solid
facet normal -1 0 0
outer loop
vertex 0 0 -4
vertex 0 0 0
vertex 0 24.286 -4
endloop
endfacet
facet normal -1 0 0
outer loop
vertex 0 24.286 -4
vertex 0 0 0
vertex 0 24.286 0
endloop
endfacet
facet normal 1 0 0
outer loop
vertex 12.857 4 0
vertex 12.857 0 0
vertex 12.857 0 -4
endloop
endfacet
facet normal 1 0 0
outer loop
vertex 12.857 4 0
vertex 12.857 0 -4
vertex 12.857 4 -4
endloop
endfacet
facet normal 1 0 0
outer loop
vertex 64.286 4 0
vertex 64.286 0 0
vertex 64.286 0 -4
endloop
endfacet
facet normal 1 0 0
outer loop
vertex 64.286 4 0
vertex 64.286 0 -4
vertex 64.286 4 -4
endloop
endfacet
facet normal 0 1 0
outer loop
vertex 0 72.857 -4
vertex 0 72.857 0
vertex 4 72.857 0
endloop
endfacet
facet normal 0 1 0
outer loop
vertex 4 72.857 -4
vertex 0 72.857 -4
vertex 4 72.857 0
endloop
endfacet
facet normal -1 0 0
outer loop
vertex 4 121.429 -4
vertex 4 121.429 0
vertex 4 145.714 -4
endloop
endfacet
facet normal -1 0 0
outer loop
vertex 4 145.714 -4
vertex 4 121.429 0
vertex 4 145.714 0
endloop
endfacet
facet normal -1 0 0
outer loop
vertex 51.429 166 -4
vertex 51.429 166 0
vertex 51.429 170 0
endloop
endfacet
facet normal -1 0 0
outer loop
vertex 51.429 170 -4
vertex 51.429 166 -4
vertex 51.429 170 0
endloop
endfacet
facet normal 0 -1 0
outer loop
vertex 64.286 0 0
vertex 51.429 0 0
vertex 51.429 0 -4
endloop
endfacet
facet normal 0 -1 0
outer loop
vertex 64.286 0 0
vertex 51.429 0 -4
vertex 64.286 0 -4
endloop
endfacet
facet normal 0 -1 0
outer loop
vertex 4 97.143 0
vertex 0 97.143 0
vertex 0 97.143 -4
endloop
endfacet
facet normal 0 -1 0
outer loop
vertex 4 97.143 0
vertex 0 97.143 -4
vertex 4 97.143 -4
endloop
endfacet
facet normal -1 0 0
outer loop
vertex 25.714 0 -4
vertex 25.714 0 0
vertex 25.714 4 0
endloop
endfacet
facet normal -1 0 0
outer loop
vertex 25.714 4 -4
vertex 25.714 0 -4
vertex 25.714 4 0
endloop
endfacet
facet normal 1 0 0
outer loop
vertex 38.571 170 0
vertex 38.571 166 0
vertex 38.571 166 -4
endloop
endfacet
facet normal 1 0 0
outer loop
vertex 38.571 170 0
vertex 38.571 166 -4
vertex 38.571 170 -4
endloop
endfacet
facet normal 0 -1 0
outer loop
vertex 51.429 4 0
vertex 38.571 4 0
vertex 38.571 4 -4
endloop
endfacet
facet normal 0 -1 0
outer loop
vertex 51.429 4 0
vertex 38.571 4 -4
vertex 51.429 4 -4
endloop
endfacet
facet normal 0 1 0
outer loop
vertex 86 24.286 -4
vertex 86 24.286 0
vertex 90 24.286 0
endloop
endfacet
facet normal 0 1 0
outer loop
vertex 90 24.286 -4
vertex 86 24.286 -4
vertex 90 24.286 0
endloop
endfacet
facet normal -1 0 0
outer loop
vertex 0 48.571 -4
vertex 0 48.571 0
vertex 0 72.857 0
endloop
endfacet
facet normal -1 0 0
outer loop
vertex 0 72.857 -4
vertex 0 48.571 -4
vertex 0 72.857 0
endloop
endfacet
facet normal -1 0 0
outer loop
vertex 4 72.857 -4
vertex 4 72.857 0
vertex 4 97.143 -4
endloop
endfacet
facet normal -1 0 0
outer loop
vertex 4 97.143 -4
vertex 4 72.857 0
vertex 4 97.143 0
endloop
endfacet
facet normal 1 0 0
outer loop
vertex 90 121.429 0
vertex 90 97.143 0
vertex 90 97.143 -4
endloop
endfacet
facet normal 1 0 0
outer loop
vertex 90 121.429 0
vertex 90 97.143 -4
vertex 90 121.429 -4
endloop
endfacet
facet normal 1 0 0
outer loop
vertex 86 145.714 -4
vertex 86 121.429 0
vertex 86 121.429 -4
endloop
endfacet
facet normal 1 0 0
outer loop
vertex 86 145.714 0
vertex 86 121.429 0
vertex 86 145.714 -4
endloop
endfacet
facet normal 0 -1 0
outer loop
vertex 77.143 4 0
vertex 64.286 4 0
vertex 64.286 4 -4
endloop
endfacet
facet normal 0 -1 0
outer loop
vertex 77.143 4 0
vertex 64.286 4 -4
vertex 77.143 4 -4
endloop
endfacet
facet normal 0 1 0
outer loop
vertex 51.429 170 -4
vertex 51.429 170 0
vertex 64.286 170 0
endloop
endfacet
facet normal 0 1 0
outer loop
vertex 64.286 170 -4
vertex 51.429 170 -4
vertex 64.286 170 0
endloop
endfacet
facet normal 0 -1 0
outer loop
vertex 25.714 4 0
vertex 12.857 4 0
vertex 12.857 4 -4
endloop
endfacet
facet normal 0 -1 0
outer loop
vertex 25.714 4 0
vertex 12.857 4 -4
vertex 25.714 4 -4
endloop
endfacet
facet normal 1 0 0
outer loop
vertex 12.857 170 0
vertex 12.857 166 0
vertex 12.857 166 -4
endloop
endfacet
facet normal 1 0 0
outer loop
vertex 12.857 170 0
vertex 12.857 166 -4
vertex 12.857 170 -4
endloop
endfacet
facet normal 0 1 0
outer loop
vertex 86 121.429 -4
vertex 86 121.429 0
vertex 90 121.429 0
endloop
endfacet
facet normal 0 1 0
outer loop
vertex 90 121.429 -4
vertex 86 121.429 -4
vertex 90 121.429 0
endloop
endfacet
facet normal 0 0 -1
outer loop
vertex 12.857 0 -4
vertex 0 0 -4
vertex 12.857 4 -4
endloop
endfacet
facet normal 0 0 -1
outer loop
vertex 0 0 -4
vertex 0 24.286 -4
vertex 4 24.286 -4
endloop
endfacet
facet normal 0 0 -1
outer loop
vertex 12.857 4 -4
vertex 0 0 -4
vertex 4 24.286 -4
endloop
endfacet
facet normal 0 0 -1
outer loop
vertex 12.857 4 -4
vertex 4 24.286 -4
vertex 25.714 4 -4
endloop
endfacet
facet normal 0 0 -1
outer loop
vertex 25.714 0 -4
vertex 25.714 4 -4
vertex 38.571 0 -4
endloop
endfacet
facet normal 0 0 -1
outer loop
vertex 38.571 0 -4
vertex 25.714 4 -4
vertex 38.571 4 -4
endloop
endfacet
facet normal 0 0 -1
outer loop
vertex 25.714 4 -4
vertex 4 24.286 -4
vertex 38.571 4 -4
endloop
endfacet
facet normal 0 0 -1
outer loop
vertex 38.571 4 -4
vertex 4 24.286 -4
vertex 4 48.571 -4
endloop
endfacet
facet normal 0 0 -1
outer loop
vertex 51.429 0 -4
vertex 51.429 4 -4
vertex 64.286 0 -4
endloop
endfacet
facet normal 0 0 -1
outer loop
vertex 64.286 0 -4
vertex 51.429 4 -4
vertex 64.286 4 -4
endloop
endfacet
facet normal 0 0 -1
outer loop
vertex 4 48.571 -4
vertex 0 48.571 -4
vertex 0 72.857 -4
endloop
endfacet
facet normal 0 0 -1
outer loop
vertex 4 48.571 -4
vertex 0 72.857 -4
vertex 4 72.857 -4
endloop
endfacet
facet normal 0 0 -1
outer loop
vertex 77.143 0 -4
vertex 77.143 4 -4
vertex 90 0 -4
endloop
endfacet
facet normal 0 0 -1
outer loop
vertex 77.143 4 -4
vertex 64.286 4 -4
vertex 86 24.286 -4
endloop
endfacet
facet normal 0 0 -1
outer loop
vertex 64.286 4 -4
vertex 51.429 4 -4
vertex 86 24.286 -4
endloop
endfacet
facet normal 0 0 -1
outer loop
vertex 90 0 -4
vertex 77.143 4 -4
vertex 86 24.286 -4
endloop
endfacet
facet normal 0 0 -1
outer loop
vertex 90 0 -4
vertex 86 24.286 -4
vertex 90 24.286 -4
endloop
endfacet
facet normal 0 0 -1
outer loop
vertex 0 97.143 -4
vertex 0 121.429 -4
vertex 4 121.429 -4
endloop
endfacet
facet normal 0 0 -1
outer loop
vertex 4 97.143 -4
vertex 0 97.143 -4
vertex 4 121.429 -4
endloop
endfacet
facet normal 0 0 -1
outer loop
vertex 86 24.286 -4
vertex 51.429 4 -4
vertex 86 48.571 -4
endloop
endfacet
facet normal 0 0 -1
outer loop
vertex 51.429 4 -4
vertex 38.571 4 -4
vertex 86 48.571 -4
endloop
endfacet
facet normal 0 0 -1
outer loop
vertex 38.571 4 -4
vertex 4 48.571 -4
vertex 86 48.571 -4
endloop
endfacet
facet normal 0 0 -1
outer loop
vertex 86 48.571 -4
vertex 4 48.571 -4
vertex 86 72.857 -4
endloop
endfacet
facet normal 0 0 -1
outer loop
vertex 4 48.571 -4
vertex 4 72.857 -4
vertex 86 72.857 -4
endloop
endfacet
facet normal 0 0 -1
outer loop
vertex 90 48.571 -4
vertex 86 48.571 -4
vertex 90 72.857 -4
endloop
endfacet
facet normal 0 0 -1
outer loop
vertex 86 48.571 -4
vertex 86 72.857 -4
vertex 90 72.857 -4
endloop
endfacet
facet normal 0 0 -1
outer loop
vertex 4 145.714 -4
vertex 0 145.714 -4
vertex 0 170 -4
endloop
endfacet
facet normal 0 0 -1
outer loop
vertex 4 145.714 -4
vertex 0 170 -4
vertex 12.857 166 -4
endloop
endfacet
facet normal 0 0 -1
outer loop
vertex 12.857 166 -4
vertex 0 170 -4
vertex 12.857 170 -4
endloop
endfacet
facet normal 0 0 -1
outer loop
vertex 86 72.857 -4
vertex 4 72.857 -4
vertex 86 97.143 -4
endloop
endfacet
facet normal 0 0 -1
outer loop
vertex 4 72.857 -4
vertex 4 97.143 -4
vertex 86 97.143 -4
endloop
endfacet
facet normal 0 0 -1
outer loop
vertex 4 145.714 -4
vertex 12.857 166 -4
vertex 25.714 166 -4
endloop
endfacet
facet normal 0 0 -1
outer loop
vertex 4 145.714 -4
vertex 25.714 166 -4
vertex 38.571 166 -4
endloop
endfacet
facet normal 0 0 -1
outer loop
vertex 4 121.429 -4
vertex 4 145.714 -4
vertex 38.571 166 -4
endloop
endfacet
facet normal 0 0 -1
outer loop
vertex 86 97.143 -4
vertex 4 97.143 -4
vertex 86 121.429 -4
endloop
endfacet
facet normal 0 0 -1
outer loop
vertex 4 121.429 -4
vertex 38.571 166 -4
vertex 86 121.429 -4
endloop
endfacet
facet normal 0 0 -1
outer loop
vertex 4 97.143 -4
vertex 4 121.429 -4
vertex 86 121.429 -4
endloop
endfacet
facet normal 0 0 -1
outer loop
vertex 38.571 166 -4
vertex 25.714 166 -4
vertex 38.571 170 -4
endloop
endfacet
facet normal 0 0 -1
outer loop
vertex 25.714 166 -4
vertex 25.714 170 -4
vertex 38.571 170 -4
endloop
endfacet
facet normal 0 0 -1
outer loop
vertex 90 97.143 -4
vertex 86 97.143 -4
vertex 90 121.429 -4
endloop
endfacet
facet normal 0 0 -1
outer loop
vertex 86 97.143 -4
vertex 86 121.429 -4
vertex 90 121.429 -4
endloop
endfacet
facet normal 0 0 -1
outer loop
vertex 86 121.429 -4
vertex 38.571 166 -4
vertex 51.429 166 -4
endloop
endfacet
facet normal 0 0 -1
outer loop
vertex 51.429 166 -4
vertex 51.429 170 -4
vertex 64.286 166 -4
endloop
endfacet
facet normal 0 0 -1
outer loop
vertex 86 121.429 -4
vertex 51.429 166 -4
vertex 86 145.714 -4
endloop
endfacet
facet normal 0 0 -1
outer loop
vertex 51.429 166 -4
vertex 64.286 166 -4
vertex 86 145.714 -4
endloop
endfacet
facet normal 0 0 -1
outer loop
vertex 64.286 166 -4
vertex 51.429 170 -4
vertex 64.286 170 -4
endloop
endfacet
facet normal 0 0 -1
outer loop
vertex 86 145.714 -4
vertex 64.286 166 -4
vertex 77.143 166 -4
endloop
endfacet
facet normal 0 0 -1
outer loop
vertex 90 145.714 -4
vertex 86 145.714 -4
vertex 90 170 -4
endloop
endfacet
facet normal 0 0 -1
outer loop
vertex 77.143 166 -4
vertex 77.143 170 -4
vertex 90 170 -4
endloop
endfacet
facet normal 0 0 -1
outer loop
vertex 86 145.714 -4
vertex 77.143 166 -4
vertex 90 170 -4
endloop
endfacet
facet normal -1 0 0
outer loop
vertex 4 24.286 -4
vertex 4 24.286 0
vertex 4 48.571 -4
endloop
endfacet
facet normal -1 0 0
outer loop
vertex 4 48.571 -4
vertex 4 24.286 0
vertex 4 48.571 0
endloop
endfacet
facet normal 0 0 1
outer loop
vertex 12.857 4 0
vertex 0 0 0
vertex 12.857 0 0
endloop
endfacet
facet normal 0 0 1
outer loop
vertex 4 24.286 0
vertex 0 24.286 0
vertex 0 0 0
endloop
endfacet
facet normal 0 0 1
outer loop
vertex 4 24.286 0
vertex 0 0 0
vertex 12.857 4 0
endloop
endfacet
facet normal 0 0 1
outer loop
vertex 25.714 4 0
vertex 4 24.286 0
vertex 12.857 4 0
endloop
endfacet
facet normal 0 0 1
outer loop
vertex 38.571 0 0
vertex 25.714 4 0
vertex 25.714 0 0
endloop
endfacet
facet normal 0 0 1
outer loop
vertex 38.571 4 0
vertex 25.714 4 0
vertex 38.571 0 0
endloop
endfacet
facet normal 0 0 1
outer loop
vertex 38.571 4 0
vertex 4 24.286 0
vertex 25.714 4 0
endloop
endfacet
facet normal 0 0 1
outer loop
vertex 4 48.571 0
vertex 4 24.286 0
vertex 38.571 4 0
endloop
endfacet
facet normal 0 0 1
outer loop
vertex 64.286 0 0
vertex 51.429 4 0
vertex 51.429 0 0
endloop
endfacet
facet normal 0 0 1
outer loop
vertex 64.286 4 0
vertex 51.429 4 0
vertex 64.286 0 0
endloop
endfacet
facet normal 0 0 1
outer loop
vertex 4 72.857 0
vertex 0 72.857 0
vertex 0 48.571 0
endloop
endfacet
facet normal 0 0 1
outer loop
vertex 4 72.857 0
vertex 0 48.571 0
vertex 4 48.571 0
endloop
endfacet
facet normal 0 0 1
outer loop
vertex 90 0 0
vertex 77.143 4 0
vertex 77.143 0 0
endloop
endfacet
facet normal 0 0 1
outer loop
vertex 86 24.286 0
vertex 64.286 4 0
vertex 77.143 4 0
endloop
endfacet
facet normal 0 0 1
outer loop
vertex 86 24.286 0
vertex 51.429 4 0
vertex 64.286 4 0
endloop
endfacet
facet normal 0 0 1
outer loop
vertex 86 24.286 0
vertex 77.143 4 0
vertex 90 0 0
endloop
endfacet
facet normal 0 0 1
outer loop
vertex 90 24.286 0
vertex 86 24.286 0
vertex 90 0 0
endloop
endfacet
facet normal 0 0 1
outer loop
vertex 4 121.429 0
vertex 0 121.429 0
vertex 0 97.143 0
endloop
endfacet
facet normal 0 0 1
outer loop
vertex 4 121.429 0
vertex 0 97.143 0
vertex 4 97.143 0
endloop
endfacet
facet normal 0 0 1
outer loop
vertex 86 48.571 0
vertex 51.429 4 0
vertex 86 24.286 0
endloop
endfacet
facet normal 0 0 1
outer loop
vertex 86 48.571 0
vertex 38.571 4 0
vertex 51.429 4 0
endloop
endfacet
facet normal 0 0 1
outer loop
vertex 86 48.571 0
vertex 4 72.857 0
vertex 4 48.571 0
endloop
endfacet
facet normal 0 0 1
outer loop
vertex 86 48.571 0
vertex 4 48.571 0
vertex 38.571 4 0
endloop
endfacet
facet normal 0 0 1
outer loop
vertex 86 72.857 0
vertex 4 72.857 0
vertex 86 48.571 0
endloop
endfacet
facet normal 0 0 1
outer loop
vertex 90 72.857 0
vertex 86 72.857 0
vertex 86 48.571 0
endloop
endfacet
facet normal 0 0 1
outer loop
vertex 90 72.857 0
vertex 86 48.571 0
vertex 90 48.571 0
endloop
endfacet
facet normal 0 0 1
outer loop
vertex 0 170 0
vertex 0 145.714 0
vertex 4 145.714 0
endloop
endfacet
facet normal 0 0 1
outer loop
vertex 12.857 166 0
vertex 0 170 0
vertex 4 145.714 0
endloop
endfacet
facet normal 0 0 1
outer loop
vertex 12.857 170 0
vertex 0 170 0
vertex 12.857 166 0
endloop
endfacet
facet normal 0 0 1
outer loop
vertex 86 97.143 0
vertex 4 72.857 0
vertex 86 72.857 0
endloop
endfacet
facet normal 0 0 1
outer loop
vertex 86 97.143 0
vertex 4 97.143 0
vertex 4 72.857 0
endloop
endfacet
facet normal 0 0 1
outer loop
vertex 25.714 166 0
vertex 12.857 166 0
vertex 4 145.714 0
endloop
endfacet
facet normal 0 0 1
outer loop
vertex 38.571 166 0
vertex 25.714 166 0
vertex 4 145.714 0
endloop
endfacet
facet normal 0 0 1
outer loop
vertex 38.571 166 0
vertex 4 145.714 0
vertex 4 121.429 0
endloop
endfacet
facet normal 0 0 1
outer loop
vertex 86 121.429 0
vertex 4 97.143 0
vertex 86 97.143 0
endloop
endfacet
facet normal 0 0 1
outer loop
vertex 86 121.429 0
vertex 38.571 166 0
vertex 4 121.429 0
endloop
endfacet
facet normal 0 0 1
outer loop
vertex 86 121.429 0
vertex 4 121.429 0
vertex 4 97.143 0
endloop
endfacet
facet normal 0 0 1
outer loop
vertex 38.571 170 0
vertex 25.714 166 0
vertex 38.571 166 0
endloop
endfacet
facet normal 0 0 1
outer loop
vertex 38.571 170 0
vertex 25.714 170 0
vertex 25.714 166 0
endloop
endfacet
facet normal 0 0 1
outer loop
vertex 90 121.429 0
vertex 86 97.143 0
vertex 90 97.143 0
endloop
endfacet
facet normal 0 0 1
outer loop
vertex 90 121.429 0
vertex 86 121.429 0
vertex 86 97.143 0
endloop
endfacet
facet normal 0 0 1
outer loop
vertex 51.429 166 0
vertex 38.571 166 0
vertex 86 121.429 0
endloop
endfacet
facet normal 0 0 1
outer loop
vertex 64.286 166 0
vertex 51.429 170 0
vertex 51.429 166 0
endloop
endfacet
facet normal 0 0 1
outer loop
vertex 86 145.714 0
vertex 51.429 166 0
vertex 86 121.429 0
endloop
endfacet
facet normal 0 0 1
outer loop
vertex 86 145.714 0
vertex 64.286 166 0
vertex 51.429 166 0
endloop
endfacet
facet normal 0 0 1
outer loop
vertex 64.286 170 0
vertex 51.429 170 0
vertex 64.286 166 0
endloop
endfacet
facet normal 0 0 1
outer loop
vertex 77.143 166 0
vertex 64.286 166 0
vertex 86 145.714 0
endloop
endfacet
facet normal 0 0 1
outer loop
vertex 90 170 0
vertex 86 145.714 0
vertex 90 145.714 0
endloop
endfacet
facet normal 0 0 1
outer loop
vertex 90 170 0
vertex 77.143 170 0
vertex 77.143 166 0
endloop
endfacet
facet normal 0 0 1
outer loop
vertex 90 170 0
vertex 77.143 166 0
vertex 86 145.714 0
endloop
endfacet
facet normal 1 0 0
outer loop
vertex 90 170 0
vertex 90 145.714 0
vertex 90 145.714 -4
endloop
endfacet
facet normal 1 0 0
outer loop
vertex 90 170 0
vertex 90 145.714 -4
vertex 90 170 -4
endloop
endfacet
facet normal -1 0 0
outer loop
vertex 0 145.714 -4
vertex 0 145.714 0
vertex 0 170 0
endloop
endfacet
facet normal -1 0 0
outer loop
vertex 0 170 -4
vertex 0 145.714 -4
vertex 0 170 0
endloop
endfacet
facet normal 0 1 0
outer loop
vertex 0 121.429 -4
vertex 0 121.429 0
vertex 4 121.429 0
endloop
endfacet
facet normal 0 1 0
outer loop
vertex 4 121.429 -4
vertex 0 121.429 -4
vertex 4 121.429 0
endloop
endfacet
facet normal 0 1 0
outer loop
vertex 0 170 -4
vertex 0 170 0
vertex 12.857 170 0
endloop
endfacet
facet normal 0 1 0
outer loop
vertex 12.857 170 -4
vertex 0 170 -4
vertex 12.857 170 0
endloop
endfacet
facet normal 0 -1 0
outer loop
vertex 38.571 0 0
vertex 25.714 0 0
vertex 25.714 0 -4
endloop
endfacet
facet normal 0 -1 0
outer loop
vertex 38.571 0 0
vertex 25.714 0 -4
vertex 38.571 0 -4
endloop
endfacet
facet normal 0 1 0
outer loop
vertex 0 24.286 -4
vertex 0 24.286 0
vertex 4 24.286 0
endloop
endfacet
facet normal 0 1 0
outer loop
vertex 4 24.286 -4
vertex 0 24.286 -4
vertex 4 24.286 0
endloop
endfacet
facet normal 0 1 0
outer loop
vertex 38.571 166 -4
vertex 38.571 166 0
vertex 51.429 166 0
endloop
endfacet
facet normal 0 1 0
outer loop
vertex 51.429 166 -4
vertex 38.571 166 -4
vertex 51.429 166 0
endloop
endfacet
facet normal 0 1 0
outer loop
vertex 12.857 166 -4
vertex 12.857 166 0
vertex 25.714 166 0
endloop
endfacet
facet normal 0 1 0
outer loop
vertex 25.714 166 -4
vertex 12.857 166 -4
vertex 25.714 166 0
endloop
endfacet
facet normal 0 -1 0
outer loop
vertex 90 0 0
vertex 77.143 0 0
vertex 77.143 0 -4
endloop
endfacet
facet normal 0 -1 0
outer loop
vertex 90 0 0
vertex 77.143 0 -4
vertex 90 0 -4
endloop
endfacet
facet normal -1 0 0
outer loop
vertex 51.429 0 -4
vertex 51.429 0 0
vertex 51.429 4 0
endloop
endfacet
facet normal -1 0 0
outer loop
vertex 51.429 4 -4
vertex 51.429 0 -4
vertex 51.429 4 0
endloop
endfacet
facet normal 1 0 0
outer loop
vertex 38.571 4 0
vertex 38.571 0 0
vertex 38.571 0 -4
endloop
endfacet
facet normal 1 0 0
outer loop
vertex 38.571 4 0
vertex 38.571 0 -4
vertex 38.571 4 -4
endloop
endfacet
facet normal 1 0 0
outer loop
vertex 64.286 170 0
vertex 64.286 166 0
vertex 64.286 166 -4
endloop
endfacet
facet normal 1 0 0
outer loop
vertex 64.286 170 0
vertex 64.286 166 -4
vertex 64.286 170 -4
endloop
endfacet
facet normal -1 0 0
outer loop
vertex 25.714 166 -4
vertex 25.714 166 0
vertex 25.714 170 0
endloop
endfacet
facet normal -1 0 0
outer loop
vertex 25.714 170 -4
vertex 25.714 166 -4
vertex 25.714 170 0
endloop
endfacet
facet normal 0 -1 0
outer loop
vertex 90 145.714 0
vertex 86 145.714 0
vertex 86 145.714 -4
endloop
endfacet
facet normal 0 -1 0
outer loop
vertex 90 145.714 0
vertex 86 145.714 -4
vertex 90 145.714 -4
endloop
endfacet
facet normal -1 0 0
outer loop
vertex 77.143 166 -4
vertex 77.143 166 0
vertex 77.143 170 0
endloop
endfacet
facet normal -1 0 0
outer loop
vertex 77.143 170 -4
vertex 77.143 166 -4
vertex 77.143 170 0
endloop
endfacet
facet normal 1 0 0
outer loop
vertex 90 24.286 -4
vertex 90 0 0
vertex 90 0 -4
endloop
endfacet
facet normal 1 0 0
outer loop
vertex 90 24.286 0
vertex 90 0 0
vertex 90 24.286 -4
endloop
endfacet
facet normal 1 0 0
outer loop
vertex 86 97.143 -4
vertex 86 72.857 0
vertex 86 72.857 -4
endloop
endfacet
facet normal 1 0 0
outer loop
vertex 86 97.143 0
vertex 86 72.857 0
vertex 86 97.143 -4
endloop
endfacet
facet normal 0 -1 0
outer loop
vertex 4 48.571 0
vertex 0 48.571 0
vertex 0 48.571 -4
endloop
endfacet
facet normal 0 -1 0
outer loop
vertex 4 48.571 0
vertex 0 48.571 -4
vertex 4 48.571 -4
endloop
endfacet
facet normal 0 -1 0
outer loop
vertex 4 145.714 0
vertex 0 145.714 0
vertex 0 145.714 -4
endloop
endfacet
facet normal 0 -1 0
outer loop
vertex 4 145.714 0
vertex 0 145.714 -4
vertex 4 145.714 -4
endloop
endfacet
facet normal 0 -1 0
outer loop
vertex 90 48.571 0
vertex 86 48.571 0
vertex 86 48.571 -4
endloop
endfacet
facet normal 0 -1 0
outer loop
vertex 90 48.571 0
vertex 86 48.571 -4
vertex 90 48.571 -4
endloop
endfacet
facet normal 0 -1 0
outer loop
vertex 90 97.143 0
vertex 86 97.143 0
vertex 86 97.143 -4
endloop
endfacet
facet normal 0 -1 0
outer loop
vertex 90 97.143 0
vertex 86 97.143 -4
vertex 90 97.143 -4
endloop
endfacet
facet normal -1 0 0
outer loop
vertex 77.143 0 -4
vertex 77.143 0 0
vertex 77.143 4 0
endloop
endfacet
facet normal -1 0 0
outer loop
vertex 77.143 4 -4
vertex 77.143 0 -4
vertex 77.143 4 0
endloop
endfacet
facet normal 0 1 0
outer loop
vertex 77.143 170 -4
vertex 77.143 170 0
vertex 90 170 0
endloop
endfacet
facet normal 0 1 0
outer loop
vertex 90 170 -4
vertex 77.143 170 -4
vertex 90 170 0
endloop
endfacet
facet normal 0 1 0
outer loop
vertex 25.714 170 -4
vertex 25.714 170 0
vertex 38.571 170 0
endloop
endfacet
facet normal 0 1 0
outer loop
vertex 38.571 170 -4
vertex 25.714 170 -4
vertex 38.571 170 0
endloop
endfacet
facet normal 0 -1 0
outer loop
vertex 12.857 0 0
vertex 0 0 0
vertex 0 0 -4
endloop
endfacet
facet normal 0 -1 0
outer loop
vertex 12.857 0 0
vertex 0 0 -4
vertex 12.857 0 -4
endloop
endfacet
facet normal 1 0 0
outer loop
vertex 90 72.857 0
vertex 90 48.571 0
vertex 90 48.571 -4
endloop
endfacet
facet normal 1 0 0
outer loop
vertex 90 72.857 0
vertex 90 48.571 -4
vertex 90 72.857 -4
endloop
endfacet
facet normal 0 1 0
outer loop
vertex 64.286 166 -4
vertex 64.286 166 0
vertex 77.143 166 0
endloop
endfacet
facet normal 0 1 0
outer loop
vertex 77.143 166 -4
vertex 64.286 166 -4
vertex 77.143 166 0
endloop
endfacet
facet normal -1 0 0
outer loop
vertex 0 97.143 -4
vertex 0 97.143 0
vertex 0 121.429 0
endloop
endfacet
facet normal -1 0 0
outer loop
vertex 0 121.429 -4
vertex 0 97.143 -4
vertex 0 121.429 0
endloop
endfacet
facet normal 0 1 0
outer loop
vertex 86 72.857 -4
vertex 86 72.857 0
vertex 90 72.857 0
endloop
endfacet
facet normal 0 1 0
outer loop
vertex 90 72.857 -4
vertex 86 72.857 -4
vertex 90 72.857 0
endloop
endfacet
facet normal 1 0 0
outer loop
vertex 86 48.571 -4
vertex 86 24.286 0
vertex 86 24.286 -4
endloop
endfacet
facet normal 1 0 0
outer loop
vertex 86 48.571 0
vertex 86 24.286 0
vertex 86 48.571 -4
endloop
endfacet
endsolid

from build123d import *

# Parameters (mm, degrees)
BUITENAFMETING_RECHTHOEK_W  = 90
BUITENAFMETING_RECHTHOEK_H  = 170
PLAAT_DEPTH                 = 4
TAND_HOR_W                  = 12.857142857
TAND_HOR_H                  = 4
TAND_BOVEN_DEPTH            = 5
TANDEN_PATROON_BOVEN_COUNT  = 3
TANDEN_PATROON_BOVEN_PITCH  = 25.714285714
TAND_VER_W                  = 4
TAND_VER_H                  = 24.285714285
TAND_LINKS_DEPTH            = 5
TANDEN_PATROON_LINKS_COUNT  = 3
TANDEN_PATROON_LINKS_PITCH  = 48.571428571
TAND_O_W                    = 12.857142857
TAND_O_H                    = 4
TAND_ONDER_DEPTH            = 5
TANDEN_PATROON_ONDER_COUNT  = 3
TANDEN_PATROON_ONDER_PITCH  = 25.714285714
TAND_R_W                    = 4
TAND_R_H                    = 24.285714285
TAND_RECHTS_DEPTH           = 5
TANDEN_PATROON_RECHTS_COUNT = 3
TANDEN_PATROON_RECHTS_PITCH = 48.571428571


with BuildPart() as part:
    # Buitenafmeting Rechthoek → Plaat (new body)
    with BuildSketch(Plane.XY):
        with Locations((45, 85)):
            Rectangle(BUITENAFMETING_RECHTHOEK_W, BUITENAFMETING_RECHTHOEK_H)
    extrude(amount=-PLAAT_DEPTH)

    # Tand Hor → Tand Boven (cut, through all)
    with BuildSketch(Plane.XY):
        with Locations((19.285714286, 168)):
            Rectangle(TAND_HOR_W, TAND_HOR_H)
    tand_boven = extrude(amount=-TAND_BOVEN_DEPTH, mode=Mode.SUBTRACT)

    # Tanden Patroon Boven: Tand Boven ×3
    with Locations(*[(i * TANDEN_PATROON_BOVEN_PITCH, 0, 0) for i in range(1, TANDEN_PATROON_BOVEN_COUNT)]):
        add(tand_boven, mode=Mode.SUBTRACT)

    # Tand Ver → Tand Links (cut, through all)
    with BuildSketch(Plane.XY):
        with Locations((2, 133.571428572)):
            Rectangle(TAND_VER_W, TAND_VER_H)
    tand_links = extrude(amount=-TAND_LINKS_DEPTH, mode=Mode.SUBTRACT)

    # Tanden Patroon Links: Tand Links ×3
    with Locations(*[(0, -i * TANDEN_PATROON_LINKS_PITCH, 0) for i in range(1, TANDEN_PATROON_LINKS_COUNT)]):
        add(tand_links, mode=Mode.SUBTRACT)

    # Tand O → Tand Onder (cut, through all)
    with BuildSketch(Plane.XY):
        with Locations((19.285714286, 2)):
            Rectangle(TAND_O_W, TAND_O_H)
    tand_onder = extrude(amount=-TAND_ONDER_DEPTH, mode=Mode.SUBTRACT)

    # Tanden Patroon Onder: Tand Onder ×3
    with Locations(*[(i * TANDEN_PATROON_ONDER_PITCH, 0, 0) for i in range(1, TANDEN_PATROON_ONDER_COUNT)]):
        add(tand_onder, mode=Mode.SUBTRACT)

    # Tand R → Tand Rechts (cut, through all)
    with BuildSketch(Plane.XY):
        with Locations((88, 133.571428572)):
            Rectangle(TAND_R_W, TAND_R_H)
    tand_rechts = extrude(amount=-TAND_RECHTS_DEPTH, mode=Mode.SUBTRACT)

    # Tanden Patroon Rechts: Tand Rechts ×3
    with Locations(*[(0, -i * TANDEN_PATROON_RECHTS_PITCH, 0) for i in range(1, TANDEN_PATROON_RECHTS_COUNT)]):
        add(tand_rechts, mode=Mode.SUBTRACT)


solid = part.part
